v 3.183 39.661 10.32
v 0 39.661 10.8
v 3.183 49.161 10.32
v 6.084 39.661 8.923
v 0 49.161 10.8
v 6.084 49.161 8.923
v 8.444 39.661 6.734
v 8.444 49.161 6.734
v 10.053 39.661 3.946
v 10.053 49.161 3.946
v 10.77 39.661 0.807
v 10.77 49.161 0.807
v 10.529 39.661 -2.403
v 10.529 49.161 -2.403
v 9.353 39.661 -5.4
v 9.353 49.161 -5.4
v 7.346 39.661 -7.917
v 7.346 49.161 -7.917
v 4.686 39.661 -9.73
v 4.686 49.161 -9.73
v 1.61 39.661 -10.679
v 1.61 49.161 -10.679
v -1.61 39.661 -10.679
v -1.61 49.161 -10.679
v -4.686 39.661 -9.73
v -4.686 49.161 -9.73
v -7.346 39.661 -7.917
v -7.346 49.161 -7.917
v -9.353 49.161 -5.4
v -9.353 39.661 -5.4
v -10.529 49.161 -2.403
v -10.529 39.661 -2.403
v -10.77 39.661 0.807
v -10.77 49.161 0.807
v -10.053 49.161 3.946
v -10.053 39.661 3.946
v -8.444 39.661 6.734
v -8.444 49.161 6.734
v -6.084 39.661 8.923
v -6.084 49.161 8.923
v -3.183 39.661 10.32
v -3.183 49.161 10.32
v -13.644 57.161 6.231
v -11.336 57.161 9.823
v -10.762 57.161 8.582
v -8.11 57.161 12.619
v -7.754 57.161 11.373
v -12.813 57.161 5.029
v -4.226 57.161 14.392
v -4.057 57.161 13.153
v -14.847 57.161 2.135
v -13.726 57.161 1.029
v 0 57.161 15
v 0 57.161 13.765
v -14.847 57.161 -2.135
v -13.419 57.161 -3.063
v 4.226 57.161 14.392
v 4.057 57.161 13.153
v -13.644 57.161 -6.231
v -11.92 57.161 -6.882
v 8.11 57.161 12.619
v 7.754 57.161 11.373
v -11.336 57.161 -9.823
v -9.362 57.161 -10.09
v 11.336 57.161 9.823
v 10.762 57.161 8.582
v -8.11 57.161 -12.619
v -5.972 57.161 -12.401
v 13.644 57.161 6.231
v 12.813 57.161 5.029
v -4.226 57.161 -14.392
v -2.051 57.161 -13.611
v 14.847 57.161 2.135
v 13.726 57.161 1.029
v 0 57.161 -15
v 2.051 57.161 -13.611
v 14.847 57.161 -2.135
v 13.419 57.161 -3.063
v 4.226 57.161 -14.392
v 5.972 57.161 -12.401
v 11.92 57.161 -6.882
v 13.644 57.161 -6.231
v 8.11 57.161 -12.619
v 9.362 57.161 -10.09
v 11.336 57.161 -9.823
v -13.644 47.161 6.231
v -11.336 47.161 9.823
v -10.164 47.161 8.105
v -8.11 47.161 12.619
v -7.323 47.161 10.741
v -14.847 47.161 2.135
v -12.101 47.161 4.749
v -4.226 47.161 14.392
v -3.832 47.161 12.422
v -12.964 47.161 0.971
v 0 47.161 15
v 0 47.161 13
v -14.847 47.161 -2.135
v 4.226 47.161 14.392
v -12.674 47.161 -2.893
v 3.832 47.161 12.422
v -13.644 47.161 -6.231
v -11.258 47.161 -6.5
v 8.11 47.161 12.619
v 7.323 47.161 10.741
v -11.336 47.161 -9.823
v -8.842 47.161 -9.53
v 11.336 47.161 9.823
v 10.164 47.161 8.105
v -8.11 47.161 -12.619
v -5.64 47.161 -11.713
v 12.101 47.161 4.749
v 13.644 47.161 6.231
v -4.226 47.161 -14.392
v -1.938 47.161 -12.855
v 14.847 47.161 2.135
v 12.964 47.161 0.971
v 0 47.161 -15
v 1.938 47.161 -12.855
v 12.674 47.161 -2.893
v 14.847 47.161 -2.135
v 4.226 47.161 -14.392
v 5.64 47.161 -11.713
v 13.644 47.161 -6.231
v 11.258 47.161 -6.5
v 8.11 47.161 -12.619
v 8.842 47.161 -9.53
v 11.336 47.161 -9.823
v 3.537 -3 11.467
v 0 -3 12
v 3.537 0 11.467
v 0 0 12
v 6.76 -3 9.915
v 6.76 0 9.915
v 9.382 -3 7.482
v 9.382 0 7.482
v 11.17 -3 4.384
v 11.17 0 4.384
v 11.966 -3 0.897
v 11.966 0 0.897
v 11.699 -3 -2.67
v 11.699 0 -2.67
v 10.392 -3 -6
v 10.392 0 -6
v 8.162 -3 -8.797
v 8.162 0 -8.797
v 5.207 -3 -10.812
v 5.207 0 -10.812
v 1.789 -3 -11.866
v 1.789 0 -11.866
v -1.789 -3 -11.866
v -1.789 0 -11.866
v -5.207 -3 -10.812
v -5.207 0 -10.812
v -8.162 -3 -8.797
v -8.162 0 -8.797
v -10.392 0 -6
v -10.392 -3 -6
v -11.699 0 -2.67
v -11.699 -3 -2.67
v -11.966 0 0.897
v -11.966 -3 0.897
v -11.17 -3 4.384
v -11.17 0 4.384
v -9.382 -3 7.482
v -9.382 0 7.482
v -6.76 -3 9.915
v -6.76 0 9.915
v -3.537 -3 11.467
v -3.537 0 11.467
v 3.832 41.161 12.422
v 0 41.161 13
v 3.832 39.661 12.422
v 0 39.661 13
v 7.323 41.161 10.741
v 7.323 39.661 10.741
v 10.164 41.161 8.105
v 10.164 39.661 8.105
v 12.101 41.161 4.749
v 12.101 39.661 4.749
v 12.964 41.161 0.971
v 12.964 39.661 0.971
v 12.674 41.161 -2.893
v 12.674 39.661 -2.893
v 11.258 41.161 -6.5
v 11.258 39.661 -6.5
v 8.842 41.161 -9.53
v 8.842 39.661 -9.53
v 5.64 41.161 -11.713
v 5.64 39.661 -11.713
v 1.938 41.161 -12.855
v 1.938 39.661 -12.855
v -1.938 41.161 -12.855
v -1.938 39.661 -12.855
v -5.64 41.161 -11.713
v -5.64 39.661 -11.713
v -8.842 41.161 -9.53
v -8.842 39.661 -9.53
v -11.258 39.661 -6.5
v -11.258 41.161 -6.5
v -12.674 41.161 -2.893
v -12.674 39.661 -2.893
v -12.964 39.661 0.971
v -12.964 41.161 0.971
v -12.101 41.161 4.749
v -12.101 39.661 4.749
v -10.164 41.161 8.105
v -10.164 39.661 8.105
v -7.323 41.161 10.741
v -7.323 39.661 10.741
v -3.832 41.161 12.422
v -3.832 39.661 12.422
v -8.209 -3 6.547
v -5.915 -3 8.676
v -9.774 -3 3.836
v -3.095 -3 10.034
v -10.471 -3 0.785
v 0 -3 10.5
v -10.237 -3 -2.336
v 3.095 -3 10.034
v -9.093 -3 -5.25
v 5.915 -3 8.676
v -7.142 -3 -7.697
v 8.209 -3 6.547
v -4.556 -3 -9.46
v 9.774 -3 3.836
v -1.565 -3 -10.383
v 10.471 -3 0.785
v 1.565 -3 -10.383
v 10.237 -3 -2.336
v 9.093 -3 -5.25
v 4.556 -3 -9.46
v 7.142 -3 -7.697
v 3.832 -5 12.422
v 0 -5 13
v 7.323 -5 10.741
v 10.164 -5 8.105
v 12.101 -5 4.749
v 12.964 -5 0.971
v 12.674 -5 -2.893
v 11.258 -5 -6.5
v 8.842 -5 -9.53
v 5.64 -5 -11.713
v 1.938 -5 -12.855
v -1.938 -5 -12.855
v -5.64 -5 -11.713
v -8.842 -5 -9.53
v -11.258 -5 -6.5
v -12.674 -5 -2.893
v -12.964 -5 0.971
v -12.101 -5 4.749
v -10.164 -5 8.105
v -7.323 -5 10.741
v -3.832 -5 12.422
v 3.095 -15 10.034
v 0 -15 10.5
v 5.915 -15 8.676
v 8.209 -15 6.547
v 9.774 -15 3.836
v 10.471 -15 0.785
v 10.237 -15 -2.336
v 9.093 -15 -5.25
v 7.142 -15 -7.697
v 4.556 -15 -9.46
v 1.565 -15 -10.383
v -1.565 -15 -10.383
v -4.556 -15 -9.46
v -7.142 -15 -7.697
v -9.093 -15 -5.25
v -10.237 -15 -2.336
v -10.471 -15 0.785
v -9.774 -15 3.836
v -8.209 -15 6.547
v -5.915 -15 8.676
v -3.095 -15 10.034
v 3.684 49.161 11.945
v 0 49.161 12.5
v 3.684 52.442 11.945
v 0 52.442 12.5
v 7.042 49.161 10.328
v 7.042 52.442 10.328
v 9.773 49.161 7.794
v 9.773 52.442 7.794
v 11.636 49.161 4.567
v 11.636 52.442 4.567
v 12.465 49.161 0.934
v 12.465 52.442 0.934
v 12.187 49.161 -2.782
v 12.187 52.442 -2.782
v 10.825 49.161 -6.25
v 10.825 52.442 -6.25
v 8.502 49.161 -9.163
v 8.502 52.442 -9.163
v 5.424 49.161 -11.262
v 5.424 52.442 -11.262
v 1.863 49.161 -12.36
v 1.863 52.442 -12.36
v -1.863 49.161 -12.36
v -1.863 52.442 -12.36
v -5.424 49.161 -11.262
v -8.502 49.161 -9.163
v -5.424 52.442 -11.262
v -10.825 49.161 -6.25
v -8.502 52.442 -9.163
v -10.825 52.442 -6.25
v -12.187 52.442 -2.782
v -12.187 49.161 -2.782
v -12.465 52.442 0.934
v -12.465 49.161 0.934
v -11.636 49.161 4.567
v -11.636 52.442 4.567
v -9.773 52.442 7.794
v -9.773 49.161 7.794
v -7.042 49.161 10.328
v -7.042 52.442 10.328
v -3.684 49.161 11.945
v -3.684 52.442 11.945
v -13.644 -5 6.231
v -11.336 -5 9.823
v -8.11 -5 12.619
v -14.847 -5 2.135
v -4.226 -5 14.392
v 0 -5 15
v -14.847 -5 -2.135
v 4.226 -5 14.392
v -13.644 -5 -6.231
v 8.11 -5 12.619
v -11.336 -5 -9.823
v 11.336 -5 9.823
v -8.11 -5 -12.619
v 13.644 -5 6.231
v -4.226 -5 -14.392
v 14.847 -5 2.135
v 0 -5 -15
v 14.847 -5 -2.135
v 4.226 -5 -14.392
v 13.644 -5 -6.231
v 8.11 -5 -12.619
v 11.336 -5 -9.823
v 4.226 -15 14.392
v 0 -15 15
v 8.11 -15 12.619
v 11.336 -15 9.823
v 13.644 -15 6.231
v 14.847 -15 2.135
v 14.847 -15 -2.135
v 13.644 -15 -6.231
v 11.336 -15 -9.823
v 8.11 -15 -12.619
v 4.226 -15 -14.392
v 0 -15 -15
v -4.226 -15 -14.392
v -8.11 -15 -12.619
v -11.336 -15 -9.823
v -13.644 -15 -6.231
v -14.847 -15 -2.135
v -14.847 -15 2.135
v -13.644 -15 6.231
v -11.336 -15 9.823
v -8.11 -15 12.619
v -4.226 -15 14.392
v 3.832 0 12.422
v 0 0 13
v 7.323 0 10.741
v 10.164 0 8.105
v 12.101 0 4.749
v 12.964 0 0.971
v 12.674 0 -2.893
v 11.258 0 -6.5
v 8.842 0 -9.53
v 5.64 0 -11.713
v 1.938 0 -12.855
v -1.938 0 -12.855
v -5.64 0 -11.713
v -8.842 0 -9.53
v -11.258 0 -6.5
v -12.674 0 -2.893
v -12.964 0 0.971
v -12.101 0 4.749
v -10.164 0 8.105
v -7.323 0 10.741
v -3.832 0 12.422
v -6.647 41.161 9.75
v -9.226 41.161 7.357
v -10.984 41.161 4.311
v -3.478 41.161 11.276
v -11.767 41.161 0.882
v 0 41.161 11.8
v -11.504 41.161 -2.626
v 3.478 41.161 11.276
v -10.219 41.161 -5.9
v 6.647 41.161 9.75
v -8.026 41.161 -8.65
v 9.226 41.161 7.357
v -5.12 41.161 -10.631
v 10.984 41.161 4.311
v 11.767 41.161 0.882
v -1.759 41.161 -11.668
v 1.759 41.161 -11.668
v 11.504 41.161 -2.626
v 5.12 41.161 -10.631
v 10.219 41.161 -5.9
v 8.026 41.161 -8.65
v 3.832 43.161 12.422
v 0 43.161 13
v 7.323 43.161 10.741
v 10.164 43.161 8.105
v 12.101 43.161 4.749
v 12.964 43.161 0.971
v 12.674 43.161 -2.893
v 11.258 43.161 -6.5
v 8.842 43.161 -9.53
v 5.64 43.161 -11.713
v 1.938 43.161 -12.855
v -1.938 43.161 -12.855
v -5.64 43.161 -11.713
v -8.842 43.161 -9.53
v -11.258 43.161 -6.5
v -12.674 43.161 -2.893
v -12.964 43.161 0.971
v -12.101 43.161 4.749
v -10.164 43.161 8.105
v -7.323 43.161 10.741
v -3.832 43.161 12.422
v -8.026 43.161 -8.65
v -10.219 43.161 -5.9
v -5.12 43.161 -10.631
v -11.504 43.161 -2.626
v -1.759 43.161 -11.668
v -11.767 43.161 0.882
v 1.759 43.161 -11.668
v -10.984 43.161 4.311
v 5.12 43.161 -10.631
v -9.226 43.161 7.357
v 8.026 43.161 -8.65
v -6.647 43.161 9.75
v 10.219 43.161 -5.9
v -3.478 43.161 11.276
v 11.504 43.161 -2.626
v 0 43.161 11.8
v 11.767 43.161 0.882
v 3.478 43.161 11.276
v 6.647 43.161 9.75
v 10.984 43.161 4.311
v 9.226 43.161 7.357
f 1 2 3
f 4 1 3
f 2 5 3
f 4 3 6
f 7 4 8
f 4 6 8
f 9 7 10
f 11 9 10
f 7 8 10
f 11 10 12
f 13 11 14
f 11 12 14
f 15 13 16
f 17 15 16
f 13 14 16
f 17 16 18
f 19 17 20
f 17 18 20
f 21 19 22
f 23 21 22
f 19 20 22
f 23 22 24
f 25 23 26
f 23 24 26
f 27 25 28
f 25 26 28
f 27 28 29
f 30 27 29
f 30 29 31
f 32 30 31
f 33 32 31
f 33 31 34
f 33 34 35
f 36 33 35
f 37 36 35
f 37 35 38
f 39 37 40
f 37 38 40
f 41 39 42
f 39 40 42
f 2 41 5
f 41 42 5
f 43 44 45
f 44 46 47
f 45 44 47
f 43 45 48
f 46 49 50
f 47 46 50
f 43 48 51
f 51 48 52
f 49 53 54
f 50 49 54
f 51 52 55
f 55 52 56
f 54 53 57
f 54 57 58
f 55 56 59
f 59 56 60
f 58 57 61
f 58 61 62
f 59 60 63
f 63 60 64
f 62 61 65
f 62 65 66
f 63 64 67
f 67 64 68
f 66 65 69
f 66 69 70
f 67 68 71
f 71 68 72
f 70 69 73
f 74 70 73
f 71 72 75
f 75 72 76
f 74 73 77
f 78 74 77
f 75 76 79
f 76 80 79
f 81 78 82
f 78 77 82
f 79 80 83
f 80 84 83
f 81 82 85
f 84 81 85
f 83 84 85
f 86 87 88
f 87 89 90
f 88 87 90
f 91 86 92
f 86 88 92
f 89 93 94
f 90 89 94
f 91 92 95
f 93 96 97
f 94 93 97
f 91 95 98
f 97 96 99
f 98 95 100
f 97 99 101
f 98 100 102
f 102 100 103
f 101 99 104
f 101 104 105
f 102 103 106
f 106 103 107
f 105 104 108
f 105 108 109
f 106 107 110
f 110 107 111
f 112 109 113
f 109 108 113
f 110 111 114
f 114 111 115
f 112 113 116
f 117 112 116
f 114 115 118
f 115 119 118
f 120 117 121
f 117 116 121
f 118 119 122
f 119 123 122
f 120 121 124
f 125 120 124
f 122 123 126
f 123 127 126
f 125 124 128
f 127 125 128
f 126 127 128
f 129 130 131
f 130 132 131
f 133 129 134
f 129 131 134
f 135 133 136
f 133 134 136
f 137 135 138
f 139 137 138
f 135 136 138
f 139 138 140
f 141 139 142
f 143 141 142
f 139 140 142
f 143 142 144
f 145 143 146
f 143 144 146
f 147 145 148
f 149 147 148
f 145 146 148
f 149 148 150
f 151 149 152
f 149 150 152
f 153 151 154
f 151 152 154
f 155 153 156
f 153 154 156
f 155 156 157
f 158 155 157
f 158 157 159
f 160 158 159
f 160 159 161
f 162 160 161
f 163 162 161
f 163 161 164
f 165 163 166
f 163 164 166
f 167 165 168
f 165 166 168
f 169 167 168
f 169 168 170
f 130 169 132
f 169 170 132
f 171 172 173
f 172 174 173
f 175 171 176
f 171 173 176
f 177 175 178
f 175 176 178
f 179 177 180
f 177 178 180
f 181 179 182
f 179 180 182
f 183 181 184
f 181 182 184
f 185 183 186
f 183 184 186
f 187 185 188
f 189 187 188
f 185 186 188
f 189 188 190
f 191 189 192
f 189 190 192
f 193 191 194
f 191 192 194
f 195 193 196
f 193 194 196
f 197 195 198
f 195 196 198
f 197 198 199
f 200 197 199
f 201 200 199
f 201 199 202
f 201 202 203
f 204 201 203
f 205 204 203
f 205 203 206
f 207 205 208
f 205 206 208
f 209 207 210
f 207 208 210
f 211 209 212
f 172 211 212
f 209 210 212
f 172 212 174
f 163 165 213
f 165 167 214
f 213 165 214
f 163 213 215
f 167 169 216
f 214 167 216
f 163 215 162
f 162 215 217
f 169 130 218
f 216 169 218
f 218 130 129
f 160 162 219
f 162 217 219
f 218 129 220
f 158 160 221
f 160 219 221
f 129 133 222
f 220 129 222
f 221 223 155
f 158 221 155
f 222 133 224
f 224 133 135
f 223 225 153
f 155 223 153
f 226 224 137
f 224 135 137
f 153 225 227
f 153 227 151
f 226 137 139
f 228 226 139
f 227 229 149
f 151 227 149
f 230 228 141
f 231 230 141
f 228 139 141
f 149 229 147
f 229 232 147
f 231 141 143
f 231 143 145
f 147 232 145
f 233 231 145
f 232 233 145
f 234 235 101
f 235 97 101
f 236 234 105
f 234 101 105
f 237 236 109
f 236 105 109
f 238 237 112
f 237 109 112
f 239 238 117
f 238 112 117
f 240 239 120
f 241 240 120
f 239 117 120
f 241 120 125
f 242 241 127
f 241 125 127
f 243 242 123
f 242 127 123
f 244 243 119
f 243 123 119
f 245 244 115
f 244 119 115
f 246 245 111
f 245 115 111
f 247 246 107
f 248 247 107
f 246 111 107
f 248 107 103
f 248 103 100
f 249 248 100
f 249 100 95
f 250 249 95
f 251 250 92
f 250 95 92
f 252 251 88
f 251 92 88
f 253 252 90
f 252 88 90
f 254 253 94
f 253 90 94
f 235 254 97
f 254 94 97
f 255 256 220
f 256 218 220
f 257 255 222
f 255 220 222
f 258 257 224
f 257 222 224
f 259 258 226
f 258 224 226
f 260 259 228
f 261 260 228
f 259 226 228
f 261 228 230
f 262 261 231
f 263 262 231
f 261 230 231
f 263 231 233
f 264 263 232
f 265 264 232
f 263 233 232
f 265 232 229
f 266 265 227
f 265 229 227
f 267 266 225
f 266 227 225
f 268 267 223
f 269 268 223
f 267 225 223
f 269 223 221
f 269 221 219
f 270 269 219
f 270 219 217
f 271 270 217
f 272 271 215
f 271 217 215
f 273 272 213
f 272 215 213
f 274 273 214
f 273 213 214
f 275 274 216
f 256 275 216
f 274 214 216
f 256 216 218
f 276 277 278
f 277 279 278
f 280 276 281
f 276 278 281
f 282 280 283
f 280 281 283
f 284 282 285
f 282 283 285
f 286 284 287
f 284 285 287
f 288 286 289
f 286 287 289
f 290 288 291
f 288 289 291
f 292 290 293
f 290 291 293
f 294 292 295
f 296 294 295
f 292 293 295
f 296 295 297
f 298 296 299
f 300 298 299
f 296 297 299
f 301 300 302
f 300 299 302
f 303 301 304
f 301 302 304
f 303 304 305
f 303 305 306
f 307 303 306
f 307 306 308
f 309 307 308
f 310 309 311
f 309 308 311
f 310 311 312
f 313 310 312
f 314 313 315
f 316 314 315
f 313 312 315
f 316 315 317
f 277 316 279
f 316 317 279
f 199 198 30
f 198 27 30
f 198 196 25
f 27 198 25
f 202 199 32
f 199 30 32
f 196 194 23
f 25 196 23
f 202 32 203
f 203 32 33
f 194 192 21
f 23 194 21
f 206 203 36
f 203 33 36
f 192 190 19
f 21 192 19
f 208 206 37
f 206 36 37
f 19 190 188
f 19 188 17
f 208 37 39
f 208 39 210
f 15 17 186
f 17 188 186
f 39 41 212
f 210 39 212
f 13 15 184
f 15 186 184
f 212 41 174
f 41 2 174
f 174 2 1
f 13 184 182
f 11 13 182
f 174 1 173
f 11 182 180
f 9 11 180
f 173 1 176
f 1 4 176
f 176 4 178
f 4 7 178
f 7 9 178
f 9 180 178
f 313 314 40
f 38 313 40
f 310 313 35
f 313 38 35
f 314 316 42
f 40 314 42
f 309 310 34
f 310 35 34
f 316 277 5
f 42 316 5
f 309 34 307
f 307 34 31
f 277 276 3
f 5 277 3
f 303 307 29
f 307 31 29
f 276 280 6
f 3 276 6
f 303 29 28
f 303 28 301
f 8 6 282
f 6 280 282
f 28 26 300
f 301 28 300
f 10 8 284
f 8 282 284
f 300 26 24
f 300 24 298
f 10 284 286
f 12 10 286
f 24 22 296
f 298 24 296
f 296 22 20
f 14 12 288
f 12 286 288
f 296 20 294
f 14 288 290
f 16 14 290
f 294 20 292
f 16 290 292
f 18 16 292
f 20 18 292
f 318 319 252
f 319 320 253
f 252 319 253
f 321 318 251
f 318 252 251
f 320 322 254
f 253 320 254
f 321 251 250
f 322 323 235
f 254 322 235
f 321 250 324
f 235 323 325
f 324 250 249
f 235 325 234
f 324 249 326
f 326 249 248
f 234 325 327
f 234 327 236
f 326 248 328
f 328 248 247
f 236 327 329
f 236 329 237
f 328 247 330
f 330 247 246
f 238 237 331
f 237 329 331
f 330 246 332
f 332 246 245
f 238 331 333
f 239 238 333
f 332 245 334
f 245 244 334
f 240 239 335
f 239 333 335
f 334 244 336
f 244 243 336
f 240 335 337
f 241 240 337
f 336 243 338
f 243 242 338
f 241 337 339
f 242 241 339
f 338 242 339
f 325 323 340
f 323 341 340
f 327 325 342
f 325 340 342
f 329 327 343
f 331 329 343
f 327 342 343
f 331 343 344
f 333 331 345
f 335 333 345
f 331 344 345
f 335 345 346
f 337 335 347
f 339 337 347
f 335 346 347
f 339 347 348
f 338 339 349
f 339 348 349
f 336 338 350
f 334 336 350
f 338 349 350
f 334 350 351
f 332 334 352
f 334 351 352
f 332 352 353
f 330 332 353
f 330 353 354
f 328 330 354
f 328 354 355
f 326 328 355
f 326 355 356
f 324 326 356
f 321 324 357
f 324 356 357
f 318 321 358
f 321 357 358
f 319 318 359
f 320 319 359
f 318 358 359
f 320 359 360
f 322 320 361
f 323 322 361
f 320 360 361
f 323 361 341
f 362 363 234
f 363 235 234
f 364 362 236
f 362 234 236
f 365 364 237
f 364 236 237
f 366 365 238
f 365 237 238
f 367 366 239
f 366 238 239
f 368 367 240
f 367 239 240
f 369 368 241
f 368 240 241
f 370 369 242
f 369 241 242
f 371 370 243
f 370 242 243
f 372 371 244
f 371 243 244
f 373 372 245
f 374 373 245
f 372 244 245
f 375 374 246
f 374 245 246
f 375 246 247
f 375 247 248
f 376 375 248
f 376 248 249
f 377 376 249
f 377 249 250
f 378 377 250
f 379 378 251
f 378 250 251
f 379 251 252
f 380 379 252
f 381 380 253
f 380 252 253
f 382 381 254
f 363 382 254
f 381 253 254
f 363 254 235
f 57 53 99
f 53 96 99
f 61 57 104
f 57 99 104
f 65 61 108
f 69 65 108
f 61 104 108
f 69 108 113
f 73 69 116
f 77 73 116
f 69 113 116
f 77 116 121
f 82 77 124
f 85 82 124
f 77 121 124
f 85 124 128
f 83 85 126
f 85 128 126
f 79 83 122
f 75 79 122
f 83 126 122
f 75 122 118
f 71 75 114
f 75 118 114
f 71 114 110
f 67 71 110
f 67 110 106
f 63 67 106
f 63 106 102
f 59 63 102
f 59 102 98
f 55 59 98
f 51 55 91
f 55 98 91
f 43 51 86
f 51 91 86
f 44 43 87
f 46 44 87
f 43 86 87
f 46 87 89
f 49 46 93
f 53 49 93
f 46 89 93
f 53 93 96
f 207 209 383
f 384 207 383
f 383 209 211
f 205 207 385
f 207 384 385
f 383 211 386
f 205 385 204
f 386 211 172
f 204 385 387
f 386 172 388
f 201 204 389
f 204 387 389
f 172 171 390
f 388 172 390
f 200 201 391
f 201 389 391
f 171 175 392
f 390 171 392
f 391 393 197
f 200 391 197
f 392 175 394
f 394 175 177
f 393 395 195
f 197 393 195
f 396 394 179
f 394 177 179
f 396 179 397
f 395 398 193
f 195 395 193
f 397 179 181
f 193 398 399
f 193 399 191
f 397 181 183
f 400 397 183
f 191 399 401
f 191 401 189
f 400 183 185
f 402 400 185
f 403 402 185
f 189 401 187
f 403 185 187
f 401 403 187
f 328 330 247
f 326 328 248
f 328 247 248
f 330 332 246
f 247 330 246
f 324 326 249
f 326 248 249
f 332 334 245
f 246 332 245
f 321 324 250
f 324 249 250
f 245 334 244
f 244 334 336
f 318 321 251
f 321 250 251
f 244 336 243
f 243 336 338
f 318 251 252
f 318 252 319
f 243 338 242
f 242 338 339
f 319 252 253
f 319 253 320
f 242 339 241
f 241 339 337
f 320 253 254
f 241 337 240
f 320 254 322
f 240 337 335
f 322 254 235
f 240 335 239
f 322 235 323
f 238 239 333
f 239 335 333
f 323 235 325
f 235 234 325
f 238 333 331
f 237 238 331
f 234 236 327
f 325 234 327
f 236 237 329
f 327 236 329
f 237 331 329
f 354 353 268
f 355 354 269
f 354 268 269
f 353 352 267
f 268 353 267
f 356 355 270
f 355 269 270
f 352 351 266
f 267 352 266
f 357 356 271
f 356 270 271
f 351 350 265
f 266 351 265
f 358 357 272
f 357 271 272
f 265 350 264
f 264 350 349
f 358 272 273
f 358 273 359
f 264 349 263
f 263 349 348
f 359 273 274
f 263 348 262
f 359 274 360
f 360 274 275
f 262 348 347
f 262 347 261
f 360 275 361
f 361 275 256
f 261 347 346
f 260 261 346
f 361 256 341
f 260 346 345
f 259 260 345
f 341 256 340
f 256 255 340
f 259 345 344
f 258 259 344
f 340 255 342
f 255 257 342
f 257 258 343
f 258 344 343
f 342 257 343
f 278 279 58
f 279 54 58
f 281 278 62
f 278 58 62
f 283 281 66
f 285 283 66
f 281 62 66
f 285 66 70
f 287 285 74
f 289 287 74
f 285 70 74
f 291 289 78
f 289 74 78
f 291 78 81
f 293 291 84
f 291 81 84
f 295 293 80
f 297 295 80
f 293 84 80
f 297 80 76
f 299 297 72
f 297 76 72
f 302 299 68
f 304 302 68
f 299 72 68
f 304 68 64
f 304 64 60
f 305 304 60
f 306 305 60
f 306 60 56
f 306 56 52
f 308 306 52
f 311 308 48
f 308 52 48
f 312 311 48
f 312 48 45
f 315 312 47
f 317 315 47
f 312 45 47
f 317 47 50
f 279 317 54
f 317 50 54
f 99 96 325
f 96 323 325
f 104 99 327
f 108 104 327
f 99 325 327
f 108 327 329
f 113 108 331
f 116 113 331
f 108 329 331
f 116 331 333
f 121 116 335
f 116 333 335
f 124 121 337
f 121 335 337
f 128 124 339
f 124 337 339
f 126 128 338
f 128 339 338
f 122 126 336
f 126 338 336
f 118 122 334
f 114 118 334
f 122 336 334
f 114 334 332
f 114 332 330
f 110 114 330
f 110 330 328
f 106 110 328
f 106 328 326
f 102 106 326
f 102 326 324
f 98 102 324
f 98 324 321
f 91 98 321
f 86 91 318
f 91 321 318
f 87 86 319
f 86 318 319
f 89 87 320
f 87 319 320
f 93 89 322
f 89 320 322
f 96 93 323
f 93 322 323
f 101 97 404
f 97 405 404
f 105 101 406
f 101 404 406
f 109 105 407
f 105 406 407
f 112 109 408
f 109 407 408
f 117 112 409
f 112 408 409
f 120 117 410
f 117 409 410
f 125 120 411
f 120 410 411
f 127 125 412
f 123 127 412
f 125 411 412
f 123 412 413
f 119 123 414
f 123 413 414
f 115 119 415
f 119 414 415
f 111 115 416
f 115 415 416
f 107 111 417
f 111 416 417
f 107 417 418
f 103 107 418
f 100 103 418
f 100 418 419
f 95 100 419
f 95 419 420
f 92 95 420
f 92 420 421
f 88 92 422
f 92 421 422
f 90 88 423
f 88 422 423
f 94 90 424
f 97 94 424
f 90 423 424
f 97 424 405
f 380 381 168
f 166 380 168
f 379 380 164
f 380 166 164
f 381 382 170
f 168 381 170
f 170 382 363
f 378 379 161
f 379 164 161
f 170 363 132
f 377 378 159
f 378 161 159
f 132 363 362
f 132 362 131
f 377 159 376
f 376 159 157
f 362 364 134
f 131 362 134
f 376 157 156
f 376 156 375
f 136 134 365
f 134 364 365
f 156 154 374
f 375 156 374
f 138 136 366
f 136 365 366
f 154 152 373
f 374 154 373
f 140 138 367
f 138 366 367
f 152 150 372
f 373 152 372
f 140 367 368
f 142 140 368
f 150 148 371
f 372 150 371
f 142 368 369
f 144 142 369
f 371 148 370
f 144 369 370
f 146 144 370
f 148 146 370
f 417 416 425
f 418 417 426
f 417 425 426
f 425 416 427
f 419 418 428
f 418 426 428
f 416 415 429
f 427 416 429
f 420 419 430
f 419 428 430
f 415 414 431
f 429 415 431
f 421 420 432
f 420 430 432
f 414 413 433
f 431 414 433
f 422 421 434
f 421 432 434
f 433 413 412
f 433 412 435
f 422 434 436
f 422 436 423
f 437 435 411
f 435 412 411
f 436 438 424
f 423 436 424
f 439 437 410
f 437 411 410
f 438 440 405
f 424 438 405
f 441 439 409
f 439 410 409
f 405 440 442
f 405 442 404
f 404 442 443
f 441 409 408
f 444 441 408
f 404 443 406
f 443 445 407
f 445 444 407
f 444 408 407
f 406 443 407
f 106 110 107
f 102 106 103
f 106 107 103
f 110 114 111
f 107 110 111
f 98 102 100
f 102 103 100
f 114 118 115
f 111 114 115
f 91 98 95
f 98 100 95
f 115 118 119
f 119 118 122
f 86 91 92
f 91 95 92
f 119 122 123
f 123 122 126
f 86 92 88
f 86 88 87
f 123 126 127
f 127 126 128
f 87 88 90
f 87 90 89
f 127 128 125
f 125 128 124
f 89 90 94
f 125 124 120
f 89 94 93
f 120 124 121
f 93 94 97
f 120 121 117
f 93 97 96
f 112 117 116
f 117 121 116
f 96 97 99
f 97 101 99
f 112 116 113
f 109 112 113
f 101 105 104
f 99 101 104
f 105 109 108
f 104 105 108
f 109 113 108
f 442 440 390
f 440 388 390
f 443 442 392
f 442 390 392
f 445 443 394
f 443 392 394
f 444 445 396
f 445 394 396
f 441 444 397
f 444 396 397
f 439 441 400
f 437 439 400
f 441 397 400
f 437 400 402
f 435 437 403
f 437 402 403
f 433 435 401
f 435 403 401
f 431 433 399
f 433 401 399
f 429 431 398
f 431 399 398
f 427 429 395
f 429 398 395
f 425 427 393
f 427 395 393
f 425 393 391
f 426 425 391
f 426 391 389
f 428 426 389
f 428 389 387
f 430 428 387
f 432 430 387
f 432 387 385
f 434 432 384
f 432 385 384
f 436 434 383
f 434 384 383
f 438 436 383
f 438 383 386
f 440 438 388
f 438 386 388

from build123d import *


with BuildPart() as f1:
    # F0 (on Right) → F1 (revolve)
    with BuildSketch(Plane.YZ):
        Polygon((-3, 12), (0, 12), (0, 13), (-5, 13), (-5, 15), (-15, 15), (-15, 10.5), (-3, 10.5), align=None)
        Polygon((41.161305, 13), (39.661305, 13), (39.661305, 10.8), (49.161305, 10.8), (49.161305, 12.5), (49.561905, 12.5), (51.441905, 12.5), (52.441905, 12.5), (57.161305, 13.764512), (57.161305, 15), (47.161305, 15), (47.161305, 13), (43.161305, 13), (43.161305, 11.8), (41.161305, 11.8), align=None)
    revolve(axis=Axis((0, 14.743851, 0), (0, 1, 0)))


with BuildPart() as f2:
    # F0 (on Right) → F2 (revolve)
    with BuildSketch(Plane.YZ):
        Polygon((-5, 13), (0, 13), (39.661305, 13), (41.161305, 13), (43.161305, 13), (47.161305, 13), (47.161305, 15), (-5, 15), align=None)
    revolve(axis=Axis((0, 14.743851, 0), (0, 1, 0)))


solid = Compound([f1.part, f2.part])
